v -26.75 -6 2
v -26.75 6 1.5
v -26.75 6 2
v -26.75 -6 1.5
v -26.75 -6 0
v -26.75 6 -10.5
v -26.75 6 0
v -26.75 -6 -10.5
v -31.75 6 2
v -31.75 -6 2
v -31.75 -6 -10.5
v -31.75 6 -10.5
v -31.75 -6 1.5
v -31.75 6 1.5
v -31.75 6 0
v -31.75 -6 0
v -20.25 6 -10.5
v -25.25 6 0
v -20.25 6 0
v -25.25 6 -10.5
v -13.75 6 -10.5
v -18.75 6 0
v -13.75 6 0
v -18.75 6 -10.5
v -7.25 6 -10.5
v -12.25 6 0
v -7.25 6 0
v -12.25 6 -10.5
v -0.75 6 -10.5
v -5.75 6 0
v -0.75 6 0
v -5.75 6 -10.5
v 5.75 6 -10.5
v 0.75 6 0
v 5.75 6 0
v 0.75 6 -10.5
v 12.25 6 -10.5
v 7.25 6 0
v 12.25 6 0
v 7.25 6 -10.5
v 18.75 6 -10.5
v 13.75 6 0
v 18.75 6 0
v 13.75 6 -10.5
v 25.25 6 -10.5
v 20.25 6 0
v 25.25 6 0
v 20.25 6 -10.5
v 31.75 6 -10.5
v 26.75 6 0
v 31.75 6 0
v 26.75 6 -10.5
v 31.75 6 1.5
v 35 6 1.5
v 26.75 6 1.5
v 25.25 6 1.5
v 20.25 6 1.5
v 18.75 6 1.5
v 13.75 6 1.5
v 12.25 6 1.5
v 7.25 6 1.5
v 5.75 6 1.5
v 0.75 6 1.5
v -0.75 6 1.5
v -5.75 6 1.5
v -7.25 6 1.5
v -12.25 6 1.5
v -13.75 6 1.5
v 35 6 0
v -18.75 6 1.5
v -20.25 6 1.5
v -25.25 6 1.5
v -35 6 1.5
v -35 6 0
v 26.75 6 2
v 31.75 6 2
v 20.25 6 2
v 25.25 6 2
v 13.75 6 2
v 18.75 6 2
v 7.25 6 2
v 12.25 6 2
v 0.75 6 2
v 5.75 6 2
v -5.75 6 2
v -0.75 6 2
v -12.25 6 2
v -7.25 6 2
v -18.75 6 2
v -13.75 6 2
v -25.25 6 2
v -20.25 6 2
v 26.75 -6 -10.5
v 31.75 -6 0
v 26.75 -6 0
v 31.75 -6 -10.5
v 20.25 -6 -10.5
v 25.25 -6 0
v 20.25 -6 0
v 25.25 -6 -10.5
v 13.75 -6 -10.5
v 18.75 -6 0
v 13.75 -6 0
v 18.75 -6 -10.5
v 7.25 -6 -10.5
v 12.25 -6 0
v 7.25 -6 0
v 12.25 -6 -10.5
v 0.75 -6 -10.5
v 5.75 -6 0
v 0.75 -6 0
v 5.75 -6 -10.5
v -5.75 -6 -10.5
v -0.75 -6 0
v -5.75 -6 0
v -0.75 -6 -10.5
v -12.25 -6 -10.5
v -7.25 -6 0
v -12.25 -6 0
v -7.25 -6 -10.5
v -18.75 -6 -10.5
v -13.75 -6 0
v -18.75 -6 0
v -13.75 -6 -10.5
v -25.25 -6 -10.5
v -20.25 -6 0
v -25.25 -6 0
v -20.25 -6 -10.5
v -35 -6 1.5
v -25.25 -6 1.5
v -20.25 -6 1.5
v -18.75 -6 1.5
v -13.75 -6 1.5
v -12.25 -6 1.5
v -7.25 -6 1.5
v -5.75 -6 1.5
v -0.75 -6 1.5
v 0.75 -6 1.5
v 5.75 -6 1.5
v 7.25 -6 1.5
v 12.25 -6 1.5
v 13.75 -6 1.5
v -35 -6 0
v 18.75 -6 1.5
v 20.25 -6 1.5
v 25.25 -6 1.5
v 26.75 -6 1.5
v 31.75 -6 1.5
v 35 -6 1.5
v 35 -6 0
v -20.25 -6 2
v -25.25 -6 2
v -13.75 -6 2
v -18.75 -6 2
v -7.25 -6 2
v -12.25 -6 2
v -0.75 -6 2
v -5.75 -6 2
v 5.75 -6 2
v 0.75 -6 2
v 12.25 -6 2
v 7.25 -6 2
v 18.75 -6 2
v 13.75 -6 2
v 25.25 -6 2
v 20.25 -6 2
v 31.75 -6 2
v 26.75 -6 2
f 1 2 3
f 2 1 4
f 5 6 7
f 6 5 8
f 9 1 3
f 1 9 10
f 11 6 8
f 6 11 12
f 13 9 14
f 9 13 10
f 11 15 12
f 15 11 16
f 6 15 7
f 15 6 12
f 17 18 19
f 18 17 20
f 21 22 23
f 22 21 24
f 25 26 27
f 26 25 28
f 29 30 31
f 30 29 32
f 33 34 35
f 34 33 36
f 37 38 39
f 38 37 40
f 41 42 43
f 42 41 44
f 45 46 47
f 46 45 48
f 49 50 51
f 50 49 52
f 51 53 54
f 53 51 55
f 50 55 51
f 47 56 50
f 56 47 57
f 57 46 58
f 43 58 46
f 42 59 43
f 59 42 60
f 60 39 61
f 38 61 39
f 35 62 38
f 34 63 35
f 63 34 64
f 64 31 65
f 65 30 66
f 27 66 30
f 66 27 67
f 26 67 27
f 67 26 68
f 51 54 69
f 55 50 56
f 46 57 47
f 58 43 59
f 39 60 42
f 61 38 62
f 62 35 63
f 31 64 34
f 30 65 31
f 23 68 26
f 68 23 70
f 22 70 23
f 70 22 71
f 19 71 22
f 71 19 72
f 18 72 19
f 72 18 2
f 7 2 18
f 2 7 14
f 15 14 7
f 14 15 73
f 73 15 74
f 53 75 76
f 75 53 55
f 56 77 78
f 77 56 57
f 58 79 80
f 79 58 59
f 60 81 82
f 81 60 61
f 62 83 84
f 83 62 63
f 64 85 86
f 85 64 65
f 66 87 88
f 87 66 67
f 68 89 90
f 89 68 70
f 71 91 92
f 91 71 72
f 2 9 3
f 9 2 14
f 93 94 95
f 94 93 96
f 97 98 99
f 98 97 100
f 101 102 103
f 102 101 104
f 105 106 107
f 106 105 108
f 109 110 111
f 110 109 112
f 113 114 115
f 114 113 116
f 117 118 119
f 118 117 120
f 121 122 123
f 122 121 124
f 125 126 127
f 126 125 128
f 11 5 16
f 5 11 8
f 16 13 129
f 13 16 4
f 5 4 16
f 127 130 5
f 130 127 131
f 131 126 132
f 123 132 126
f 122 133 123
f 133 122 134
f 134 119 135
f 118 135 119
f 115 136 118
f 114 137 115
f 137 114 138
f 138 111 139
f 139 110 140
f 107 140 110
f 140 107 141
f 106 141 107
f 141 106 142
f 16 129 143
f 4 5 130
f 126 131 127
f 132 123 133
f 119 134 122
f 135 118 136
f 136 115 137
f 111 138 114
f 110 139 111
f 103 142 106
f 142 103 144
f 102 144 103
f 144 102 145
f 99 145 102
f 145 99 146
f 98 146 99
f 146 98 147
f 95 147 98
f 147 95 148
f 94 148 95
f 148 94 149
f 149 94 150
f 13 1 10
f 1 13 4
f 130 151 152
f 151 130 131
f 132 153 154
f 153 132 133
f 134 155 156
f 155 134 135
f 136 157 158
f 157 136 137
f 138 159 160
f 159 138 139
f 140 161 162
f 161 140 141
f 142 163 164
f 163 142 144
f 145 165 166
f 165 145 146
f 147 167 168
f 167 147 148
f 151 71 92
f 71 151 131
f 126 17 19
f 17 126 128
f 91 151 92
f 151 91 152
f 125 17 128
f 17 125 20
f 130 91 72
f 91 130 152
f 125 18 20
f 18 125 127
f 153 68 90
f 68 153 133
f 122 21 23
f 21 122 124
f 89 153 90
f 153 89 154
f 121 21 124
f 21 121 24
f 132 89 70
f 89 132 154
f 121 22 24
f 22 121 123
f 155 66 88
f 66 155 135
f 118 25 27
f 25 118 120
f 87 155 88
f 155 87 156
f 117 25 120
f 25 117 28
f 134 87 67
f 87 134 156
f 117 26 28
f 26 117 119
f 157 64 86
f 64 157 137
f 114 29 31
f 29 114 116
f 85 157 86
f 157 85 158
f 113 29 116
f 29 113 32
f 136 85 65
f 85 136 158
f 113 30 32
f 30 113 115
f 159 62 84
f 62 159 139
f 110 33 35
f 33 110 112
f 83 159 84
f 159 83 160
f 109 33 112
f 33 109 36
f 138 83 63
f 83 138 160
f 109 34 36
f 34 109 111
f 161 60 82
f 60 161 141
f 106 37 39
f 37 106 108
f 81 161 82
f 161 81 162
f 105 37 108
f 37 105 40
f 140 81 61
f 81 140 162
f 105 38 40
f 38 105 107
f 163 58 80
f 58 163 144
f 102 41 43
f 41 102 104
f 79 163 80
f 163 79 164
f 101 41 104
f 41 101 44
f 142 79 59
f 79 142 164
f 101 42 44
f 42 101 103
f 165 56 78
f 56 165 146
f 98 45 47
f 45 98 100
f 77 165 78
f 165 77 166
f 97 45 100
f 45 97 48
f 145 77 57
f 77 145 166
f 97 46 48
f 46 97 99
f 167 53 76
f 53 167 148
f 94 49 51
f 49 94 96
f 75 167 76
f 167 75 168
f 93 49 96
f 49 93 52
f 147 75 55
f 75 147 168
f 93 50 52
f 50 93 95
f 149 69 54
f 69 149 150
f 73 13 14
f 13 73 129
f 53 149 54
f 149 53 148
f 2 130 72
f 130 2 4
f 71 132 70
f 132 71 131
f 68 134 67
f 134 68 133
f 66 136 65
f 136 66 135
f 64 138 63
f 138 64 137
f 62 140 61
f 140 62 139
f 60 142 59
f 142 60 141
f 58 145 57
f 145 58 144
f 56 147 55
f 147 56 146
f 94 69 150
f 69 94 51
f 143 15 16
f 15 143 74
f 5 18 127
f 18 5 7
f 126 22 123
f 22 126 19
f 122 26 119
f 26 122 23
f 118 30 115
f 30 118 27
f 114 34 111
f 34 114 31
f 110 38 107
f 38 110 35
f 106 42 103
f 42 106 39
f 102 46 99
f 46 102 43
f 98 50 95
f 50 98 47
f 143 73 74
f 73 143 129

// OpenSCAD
// 10-well comb for casting agarose gels
// Print orientation: flat on bed, teeth pointing down (-Z)

// ---------- Parameters ----------
spine_len      = 70;    // spine length along X (mm)
spine_wid      = 12;    // spine width along Y (mm)
plate_thk      = 1.5;   // plate thickness along Z (mm)

tooth_count    = 10;    // number of teeth
tooth_w        = 5.0;   // tooth width along X (mm)
tooth_len      = 12;    // tooth length along Y (mm)
tooth_depth    = 12;    // tooth height from spine into plate (mm)
tooth_gap      = 1.5;   // gap between neighbouring teeth (mm)

eps            = 0.5;   // cutter overshoot past faces (mm)

$fn = 64;

// ---------- Derived ----------
pitch   = tooth_w + tooth_gap;            // centre-to-centre spacing
x_start = -(tooth_count - 1) * pitch / 2; // first tooth centre (row centred)

// ---------- Model ----------
union() {
    // Spine (back bar)
    translate([-spine_len / 2, -spine_wid / 2, 0])
        cube([spine_len, spine_wid, plate_thk]);

    // Teeth hanging from the -Y edge of the spine
    for (i = [0 : tooth_count - 1])
        translate([x_start + i * pitch - tooth_w / 2,
                   spine_wid / 2 - tooth_len,
                   plate_thk - tooth_depth])
            cube([tooth_w, tooth_len, tooth_depth + eps]);
}
